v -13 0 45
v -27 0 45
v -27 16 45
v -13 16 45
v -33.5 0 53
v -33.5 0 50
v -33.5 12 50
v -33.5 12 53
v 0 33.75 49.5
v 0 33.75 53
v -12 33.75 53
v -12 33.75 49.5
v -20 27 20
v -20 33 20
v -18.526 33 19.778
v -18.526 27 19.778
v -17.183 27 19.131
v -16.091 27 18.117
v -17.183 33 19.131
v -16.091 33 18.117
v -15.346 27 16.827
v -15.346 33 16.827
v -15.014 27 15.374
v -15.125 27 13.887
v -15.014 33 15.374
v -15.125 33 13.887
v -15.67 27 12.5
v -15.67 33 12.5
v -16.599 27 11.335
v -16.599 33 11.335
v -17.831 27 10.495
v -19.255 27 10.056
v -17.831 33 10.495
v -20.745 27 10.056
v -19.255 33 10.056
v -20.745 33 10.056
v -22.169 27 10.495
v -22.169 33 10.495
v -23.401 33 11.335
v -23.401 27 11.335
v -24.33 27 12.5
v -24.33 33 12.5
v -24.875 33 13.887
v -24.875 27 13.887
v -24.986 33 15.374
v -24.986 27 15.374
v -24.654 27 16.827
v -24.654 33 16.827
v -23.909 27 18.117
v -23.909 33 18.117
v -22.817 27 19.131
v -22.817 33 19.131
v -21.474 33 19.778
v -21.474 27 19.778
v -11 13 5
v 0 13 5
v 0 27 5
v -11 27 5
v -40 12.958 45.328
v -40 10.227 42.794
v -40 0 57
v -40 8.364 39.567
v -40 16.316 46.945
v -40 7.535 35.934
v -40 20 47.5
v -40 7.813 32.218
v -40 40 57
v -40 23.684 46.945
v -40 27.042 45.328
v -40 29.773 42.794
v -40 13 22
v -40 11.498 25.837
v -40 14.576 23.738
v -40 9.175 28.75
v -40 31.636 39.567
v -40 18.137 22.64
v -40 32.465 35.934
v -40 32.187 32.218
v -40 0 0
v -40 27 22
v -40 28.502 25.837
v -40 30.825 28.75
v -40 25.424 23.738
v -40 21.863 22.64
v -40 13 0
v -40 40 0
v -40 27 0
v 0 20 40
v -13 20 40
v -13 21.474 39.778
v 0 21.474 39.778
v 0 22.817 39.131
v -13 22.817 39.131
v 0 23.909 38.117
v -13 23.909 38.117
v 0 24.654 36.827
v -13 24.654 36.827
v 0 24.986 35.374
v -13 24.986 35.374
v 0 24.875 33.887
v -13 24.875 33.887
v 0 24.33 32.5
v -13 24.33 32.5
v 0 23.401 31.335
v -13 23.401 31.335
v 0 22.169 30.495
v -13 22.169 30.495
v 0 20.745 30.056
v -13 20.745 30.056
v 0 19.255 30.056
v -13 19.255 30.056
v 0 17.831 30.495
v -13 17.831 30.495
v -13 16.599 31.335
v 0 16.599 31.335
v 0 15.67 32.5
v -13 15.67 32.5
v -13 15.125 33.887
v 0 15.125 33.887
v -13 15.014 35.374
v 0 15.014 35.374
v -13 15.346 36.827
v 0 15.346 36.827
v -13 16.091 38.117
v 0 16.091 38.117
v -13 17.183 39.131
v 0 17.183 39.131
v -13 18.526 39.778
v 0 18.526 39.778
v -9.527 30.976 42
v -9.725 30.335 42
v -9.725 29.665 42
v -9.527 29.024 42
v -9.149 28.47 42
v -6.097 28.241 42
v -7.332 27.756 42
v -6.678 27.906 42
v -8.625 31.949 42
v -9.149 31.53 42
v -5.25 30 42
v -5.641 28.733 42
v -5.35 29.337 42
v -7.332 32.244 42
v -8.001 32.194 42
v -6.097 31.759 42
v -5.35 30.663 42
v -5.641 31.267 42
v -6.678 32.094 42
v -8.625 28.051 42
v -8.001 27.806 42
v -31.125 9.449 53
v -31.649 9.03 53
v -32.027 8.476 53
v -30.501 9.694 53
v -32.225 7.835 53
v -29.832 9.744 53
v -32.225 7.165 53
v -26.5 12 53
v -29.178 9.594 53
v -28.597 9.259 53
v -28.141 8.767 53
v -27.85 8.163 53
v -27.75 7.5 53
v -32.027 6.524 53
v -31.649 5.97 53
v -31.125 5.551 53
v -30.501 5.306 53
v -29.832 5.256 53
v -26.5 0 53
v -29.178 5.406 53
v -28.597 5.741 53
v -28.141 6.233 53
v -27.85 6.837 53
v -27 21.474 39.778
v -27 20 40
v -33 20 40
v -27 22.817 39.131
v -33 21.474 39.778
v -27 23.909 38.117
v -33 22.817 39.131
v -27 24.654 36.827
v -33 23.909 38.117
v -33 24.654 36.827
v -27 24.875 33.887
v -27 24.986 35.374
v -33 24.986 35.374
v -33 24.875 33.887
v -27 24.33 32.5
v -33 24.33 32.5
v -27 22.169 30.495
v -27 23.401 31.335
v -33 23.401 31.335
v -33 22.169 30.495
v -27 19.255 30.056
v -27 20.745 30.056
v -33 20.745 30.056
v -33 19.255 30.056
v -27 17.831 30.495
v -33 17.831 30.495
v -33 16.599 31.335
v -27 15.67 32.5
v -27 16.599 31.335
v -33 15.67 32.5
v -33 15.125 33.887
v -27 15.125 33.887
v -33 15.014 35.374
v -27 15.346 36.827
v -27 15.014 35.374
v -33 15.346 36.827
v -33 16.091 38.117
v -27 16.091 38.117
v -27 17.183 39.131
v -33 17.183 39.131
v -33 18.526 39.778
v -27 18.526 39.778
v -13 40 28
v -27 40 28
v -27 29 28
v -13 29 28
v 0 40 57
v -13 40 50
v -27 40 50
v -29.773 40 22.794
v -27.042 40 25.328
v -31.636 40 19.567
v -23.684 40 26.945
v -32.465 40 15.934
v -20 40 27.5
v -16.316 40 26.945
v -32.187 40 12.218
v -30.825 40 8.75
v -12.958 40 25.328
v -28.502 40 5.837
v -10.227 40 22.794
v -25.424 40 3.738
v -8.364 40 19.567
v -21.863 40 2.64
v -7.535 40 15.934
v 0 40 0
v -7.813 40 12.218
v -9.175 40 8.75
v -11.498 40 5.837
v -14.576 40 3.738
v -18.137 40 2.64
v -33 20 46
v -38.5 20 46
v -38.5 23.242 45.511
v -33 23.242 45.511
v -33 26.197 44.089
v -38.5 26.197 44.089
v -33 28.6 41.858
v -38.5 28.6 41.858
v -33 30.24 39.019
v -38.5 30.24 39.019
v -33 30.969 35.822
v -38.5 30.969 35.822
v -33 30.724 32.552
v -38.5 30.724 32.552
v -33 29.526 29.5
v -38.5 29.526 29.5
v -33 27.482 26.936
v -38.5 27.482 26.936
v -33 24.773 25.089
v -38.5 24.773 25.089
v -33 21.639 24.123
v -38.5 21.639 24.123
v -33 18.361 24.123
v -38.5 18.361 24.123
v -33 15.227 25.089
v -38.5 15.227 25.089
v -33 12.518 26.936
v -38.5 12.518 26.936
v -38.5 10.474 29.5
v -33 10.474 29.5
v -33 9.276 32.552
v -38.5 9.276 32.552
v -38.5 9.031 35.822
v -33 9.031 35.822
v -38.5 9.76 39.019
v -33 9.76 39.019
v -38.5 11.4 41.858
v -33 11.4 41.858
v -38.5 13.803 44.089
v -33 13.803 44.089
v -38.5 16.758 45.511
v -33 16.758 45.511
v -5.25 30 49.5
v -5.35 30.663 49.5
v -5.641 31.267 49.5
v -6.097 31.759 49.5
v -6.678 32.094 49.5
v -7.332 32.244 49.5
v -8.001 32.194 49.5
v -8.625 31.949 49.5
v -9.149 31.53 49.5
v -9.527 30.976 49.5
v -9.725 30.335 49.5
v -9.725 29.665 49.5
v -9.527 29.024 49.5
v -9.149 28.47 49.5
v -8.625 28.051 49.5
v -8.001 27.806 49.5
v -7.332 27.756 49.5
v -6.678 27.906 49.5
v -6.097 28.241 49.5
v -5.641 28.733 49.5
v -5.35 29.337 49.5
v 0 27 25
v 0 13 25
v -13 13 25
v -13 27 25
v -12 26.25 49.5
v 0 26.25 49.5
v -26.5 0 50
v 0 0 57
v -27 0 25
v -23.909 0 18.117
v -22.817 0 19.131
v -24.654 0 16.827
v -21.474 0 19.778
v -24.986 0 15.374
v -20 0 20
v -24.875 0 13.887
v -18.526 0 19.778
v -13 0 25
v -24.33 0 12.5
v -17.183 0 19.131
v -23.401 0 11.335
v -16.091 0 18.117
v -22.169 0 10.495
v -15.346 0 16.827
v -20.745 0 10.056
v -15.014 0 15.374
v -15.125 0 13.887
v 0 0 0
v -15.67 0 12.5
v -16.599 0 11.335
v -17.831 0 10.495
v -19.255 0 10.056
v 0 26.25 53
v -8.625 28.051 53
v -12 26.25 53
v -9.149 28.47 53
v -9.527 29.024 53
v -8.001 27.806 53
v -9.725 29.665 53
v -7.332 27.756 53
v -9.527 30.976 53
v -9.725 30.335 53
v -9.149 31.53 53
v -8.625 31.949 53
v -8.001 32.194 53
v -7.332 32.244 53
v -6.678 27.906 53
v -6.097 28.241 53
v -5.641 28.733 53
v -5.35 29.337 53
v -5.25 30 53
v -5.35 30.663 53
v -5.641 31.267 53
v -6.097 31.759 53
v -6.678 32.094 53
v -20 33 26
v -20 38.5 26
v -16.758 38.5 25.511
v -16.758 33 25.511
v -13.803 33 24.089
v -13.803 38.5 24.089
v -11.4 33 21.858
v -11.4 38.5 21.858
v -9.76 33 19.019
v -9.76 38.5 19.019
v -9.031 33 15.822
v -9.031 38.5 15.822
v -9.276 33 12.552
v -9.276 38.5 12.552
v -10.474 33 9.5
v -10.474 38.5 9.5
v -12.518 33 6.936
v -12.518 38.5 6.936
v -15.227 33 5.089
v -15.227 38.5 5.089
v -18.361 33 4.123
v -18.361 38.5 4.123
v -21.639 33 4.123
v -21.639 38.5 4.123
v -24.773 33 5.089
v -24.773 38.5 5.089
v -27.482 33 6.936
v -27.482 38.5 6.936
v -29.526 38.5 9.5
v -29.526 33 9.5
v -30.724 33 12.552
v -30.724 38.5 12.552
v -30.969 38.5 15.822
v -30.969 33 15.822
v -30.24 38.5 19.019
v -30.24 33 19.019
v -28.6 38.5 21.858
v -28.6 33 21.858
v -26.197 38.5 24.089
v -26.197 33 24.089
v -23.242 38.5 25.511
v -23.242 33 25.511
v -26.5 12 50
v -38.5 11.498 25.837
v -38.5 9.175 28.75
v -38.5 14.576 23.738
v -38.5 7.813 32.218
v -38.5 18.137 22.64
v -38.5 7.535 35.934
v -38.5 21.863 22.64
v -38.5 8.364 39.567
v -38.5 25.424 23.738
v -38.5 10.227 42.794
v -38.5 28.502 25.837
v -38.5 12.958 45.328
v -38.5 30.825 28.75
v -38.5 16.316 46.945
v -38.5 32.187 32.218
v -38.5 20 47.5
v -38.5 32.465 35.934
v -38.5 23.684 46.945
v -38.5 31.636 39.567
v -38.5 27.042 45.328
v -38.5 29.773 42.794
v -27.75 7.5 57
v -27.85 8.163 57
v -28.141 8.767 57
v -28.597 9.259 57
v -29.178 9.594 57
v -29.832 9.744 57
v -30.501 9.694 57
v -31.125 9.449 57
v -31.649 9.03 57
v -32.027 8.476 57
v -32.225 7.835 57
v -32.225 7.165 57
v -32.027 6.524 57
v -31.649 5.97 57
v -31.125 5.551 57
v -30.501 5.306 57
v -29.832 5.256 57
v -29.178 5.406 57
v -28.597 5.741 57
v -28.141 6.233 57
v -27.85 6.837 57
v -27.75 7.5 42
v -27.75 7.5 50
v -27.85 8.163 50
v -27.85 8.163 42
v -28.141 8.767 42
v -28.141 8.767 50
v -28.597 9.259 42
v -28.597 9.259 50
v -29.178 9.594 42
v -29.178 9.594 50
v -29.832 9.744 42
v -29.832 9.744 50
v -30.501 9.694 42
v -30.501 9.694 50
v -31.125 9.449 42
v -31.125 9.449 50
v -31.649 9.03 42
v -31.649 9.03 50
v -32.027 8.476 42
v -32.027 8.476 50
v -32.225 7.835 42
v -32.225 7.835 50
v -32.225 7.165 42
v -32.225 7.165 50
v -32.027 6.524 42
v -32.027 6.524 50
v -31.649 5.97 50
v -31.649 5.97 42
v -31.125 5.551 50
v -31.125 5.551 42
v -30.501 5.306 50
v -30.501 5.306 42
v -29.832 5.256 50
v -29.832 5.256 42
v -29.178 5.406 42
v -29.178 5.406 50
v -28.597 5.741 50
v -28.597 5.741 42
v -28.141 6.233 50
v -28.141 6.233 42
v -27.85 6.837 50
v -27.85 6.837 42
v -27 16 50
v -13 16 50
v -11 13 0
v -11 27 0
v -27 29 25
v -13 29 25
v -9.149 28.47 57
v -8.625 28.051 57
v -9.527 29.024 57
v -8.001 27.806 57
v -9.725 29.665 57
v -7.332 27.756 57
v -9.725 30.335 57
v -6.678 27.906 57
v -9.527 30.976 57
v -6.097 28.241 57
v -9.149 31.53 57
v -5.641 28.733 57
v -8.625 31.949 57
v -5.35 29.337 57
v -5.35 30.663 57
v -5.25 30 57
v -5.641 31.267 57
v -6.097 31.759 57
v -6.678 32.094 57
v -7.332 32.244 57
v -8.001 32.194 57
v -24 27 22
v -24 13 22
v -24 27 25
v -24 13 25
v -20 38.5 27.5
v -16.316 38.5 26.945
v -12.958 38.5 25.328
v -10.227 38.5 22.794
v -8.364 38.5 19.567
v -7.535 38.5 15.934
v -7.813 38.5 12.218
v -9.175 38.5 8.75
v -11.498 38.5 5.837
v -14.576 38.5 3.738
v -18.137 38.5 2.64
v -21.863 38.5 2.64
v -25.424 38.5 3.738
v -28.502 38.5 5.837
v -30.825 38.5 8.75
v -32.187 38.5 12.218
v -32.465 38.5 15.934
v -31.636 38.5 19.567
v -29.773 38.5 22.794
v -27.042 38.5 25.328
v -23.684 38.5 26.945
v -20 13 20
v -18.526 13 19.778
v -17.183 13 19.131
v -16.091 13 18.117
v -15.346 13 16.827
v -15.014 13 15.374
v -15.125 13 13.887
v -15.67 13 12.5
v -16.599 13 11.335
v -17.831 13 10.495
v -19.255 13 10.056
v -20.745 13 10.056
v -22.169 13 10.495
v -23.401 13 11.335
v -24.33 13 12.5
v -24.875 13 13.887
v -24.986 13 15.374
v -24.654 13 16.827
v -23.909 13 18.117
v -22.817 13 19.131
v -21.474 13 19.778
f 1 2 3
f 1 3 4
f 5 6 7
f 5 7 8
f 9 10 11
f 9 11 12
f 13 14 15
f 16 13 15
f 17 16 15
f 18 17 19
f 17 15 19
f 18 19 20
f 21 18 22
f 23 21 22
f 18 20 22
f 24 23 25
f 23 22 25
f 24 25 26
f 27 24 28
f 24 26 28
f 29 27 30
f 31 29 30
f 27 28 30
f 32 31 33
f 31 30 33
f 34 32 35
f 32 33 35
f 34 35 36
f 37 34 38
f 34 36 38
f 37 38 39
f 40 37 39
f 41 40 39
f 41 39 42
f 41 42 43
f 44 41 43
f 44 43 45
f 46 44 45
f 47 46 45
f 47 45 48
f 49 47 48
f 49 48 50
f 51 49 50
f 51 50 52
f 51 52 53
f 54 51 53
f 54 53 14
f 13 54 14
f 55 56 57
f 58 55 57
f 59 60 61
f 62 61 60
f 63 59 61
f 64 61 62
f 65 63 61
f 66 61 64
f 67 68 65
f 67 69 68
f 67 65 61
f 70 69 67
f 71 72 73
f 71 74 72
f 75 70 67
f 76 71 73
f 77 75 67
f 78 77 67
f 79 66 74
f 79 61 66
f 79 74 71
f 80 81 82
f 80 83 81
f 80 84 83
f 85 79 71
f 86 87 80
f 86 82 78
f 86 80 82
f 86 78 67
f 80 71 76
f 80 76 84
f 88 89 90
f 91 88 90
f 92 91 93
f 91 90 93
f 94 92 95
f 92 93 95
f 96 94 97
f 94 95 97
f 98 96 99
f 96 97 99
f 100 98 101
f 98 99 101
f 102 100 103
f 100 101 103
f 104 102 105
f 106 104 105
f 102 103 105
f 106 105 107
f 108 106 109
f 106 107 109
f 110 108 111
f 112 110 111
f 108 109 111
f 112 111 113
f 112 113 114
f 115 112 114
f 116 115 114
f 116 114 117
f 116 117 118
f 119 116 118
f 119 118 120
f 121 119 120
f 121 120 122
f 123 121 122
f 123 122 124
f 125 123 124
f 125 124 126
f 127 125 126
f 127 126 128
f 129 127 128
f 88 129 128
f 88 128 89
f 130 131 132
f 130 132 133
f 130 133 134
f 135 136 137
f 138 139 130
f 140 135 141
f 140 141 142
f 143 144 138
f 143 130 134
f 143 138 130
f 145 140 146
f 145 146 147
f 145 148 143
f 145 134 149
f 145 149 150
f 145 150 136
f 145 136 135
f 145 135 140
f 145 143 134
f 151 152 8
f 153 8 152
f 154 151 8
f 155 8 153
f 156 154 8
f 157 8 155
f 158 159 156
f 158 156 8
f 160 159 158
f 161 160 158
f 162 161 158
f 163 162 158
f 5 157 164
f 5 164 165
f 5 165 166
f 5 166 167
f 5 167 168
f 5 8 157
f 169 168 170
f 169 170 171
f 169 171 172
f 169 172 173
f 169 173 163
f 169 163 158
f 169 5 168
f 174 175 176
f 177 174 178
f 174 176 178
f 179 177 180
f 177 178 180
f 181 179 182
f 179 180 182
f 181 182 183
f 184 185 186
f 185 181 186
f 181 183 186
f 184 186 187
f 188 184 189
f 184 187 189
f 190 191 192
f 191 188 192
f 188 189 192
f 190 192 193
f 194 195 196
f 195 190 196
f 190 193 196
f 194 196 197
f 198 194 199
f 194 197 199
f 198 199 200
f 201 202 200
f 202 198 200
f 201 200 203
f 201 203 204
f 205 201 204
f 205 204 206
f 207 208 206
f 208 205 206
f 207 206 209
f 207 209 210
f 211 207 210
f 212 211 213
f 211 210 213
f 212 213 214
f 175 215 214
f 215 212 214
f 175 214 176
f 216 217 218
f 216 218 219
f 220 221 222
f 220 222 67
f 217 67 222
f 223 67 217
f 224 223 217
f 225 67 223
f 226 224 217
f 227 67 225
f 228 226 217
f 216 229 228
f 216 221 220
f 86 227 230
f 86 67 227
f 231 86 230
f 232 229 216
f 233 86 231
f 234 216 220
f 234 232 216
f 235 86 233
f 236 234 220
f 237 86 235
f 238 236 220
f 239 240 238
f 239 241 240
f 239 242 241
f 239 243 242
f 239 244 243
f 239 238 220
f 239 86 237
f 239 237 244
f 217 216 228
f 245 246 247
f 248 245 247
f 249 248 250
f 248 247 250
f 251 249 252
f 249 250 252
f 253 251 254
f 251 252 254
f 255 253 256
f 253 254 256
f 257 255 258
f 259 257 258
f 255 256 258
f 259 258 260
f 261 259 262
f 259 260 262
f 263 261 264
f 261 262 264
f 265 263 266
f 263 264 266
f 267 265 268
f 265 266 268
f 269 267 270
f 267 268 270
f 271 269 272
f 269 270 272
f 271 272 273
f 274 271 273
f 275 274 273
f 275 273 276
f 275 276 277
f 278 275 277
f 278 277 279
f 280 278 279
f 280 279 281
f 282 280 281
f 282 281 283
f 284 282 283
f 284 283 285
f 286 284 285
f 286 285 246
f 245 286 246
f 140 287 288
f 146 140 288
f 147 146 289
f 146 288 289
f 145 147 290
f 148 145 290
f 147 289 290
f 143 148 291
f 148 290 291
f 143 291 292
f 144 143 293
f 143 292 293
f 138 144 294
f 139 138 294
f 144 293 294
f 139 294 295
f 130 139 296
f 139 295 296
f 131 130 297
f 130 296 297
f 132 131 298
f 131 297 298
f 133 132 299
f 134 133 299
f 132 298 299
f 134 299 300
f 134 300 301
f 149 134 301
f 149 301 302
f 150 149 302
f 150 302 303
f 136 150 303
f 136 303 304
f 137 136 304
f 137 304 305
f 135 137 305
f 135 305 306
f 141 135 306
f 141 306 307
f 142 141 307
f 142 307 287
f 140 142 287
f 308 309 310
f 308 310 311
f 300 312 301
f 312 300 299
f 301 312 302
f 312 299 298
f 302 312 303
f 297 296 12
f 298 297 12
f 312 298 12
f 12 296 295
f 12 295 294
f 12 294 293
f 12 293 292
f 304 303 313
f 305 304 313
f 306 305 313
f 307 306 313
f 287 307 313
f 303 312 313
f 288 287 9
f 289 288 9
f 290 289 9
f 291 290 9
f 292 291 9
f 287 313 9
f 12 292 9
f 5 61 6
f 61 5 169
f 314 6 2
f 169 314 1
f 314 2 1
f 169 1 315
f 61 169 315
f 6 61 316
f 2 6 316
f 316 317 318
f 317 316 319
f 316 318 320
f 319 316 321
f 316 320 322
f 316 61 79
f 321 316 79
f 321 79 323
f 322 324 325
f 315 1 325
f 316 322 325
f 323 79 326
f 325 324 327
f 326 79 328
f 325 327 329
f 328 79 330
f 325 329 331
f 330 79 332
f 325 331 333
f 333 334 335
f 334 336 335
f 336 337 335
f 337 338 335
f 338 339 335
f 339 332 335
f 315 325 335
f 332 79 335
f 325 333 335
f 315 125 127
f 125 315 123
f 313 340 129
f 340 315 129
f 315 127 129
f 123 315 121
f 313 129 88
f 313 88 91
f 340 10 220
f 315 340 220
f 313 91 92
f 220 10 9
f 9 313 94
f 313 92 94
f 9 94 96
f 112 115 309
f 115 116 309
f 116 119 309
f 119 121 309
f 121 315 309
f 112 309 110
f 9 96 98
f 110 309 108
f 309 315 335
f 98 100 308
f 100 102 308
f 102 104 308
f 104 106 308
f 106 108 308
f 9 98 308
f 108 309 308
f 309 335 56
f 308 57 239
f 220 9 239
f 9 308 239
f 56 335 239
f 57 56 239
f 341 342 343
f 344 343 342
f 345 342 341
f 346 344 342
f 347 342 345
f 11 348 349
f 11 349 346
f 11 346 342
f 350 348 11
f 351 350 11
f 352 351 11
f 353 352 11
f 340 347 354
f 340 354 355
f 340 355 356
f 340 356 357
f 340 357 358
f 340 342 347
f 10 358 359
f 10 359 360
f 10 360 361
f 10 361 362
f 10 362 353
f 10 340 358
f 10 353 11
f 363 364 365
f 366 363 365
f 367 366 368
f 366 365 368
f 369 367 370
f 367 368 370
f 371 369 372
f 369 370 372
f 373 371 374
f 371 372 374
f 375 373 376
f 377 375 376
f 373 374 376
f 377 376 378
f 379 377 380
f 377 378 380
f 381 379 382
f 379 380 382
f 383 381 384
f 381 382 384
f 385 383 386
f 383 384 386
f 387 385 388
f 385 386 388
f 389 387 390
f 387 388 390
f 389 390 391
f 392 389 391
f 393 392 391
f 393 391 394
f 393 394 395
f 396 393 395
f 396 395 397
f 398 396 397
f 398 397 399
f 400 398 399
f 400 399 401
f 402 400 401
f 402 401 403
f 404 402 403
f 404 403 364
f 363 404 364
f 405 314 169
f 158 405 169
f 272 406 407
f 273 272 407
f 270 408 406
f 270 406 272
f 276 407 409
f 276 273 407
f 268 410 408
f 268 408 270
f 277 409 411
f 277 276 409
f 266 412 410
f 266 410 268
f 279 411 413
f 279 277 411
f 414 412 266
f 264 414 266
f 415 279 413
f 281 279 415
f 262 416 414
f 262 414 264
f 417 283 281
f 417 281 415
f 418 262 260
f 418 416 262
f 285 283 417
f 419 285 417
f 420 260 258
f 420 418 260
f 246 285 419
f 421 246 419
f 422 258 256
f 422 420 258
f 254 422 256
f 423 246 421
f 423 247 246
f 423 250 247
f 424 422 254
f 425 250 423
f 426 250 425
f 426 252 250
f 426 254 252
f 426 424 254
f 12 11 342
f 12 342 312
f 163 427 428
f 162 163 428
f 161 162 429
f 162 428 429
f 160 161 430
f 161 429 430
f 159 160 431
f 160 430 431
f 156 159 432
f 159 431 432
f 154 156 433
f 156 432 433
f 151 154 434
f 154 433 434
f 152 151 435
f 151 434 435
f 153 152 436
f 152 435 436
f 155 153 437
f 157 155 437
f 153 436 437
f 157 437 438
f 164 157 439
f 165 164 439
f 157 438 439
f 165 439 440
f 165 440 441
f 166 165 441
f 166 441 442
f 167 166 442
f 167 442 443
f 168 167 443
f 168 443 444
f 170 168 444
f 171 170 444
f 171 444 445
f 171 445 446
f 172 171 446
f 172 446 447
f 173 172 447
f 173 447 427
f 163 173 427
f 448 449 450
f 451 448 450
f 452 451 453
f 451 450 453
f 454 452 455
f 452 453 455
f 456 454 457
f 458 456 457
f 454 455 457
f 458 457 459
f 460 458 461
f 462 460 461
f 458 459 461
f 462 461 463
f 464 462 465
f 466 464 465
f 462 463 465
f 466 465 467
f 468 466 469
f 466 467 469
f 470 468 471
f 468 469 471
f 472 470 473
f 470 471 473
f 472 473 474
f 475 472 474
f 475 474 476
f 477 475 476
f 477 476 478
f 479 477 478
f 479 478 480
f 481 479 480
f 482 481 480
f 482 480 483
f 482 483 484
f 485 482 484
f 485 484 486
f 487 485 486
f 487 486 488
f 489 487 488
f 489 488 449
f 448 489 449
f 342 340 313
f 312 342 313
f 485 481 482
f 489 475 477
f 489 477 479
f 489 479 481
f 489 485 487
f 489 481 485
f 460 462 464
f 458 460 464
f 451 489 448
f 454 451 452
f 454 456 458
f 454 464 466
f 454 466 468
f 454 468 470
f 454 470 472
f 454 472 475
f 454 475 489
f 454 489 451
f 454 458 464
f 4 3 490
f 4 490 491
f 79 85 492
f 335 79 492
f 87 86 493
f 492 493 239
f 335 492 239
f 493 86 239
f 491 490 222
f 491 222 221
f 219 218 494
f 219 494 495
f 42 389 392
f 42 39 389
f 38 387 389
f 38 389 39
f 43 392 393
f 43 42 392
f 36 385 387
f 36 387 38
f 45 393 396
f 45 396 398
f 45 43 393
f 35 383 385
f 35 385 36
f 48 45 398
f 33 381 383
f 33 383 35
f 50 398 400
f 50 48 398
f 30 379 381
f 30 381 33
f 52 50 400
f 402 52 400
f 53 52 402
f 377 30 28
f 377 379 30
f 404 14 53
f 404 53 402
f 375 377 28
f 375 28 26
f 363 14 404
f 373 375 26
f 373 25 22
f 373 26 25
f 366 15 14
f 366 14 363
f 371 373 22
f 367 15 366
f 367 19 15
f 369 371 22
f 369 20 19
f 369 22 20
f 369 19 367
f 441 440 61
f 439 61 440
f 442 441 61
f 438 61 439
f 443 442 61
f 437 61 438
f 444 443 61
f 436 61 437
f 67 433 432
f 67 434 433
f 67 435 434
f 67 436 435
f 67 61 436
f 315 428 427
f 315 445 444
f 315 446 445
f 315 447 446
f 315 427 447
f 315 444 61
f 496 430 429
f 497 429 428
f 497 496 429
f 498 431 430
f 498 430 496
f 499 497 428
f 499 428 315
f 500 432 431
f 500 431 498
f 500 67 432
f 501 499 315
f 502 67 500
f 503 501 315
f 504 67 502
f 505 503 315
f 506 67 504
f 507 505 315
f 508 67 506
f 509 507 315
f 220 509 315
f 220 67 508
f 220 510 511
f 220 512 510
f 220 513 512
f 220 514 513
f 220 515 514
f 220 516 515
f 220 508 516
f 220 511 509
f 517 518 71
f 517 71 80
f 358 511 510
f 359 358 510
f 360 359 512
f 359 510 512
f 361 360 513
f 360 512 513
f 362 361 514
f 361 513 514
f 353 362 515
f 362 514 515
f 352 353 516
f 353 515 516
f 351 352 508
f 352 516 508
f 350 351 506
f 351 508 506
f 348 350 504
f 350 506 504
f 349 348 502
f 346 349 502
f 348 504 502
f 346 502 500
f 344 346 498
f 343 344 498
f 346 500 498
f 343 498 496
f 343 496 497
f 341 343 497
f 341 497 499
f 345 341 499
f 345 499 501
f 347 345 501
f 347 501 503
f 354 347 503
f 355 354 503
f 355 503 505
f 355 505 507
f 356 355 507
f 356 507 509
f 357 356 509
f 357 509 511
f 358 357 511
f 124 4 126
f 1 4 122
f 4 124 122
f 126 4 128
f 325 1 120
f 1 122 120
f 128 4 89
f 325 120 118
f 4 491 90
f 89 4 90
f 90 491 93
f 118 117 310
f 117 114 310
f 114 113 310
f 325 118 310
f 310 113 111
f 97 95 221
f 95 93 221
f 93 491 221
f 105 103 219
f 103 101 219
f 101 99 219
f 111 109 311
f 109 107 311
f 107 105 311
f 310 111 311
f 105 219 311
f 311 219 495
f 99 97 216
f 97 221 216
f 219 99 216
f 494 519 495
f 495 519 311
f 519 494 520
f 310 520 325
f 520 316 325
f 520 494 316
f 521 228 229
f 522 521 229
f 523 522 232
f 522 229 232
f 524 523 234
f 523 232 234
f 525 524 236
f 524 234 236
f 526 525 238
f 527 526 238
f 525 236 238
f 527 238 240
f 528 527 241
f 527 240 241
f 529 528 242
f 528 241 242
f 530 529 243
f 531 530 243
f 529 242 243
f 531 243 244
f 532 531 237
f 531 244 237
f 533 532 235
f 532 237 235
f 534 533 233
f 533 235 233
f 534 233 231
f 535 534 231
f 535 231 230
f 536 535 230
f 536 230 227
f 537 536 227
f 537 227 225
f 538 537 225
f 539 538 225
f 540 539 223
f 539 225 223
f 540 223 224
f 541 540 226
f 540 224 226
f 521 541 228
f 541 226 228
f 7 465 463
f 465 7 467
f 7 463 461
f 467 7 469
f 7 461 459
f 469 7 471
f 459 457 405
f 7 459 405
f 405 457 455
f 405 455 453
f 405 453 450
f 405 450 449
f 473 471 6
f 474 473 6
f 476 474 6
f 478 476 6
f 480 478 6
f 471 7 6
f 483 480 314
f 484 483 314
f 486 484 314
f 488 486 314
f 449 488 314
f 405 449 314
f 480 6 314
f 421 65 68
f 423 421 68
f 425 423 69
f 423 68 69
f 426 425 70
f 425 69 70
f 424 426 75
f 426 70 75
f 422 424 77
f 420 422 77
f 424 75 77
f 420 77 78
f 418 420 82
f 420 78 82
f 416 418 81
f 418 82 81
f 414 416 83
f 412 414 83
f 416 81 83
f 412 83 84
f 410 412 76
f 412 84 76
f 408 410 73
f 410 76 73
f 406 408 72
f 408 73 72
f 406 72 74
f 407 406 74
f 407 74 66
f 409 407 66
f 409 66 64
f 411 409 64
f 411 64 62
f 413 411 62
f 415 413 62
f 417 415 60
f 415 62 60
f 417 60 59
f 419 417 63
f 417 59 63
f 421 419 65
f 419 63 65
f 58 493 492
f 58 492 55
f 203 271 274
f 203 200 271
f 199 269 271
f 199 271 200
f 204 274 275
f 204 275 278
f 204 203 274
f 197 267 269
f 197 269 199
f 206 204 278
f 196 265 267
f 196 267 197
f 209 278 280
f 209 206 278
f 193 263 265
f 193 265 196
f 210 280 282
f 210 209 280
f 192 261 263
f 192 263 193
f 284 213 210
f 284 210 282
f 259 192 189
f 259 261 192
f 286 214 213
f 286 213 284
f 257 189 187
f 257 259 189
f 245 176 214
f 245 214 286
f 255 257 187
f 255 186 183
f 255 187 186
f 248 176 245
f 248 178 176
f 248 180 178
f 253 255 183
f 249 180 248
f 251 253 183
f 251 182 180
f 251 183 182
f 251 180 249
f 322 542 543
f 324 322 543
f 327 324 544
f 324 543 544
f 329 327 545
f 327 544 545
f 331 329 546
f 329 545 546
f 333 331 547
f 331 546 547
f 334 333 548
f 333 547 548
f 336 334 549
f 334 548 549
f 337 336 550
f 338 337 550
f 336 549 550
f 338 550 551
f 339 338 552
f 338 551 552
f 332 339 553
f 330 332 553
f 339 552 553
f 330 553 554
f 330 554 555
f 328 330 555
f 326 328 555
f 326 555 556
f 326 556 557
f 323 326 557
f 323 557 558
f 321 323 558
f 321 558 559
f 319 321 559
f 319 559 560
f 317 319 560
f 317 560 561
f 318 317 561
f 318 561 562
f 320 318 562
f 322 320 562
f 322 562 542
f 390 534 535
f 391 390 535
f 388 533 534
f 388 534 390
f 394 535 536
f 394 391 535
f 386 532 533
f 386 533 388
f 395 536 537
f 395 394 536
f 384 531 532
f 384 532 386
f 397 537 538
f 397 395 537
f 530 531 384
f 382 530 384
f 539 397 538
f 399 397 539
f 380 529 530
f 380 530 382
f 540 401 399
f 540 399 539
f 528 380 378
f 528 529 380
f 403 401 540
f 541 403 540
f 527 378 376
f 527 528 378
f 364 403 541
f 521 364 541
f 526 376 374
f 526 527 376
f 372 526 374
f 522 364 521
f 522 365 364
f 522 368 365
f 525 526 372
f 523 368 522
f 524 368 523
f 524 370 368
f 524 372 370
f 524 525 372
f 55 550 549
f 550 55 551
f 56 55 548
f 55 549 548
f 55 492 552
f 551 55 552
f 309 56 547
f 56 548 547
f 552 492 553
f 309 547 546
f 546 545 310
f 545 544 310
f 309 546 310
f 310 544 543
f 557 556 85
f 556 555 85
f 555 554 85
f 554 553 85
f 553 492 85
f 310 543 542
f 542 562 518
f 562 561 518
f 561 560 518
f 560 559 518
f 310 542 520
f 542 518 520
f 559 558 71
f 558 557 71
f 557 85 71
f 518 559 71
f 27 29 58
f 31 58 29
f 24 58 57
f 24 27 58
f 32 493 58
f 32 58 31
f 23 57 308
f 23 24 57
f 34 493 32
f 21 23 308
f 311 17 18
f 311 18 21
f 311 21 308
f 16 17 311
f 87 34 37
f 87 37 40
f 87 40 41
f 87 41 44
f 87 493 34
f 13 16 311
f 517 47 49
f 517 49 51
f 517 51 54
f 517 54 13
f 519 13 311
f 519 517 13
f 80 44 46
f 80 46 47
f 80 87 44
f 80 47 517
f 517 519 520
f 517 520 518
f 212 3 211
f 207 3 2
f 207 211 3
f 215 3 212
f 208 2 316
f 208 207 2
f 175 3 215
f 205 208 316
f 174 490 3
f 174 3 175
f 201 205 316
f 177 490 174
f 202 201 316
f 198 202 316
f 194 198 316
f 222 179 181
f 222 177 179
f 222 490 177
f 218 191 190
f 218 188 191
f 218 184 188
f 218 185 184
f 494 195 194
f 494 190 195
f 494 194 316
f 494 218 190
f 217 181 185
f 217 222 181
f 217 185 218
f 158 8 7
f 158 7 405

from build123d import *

# Parameters (mm, degrees)
ESQUISSE1_W              = 40
ESQUISSE1_H              = 40
BOSS_EXTRU_1_DEPTH       = 50
ESQUISSE2_R              = 5
ENL_V_MAT_EXTRU_1_DEPTH  = 41
ESQUISSE3_R              = 5
ENL_V_MAT_EXTRU_2_DEPTH  = 41
ESQUISSE4_W              = 22
ESQUISSE4_H              = 14
ENL_V_MAT_EXTRU_3_DEPTH  = 29
ESQUISSE5_W              = 14
ESQUISSE5_H              = 20
ENL_V_MAT_EXTRU_4_DEPTH  = 29
ESQUISSE6_W              = 20
ESQUISSE6_H              = 14
ENL_V_MAT_EXTRU_5_DEPTH  = 24
ESQUISSE7_W              = 14
ESQUISSE7_H              = 22
ENL_V_MAT_EXTRU_6_DEPTH  = 24
ESQUISSE10_R             = 11
ENL_V_MAT_EXTRU_9_DEPTH  = 7
ESQUISSE11_R             = 12.5
ENL_V_MAT_EXTRU_10_DEPTH = 1.5
ESQUISSE14_R             = 11
ENL_V_MAT_EXTRU_11_DEPTH = 7
ESQUISSE15_R             = 12.5
ENL_V_MAT_EXTRU_12_DEPTH = 1.5
ESQUISSE16_W             = 40
ESQUISSE16_H             = 40
BOSS_EXTRU_2_DEPTH       = 7
ESQUISSE17_R             = 2.25
ENL_V_MAT_EXTRU_13_DEPTH = 15
ESQUISSE18_W             = 7
ESQUISSE18_H             = 3
ENL_V_MAT_EXTRU_14_DEPTH = 12
ESQUISSE19_W             = 3.5
ESQUISSE19_H             = 7.5
ENL_V_MAT_EXTRU_15_DEPTH = 12


with BuildPart() as part:
    # Esquisse1 → Boss.-Extru.1 (new body)
    with BuildSketch(Plane.XY):
        with Locations((-20, 20)):
            Rectangle(ESQUISSE1_W, ESQUISSE1_H)
    extrude(amount=BOSS_EXTRU_1_DEPTH)

    # Esquisse2 → Enlèv. mat.-Extru.1 (cut, through all)
    with BuildSketch(Plane(origin=(0, 40, 0), x_dir=(1, 0, 0), z_dir=(0, 1, 0))):
        with Locations(Location((-20, -15, 0), (0, 0, 270))):  # turned: the seam where the file's is
            Circle(ESQUISSE2_R)
    extrude(amount=-ENL_V_MAT_EXTRU_1_DEPTH, mode=Mode.SUBTRACT)

    # Esquisse3 → Enlèv. mat.-Extru.2 (cut, through all)
    with BuildSketch(Plane.ZY.offset(40)):
        with Locations((35, 20)):
            Circle(ESQUISSE3_R)
    extrude(amount=-ENL_V_MAT_EXTRU_2_DEPTH, mode=Mode.SUBTRACT)

    # Esquisse4 → Enlèv. mat.-Extru.3 (cut)
    with BuildSketch(Plane.ZY.offset(40)):
        with Locations((11, 20)):
            Rectangle(ESQUISSE4_W, ESQUISSE4_H)
    extrude(amount=-ENL_V_MAT_EXTRU_3_DEPTH, mode=Mode.SUBTRACT)

    # Esquisse5 → Enlèv. mat.-Extru.4 (cut)
    with BuildSketch(Plane.XZ):
        with Locations((-20, 35)):
            Rectangle(ESQUISSE5_W, ESQUISSE5_H)
    extrude(amount=-ENL_V_MAT_EXTRU_4_DEPTH, mode=Mode.SUBTRACT)

    # Esquisse6 → Enlèv. mat.-Extru.5 (cut)
    with BuildSketch(Plane(origin=(0, 0, 0), x_dir=(0, 0, -1), z_dir=(1, 0, 0))):
        with Locations((-15, 20)):
            Rectangle(ESQUISSE6_W, ESQUISSE6_H)
    extrude(amount=-ENL_V_MAT_EXTRU_5_DEPTH, mode=Mode.SUBTRACT)

    # Esquisse7 → Enlèv. mat.-Extru.6 (cut)
    with BuildSketch(Plane(origin=(0, 40, 0), x_dir=(1, 0, 0), z_dir=(0, 1, 0))):
        with Locations((-20, -39)):
            Rectangle(ESQUISSE7_W, ESQUISSE7_H)
    extrude(amount=-ENL_V_MAT_EXTRU_6_DEPTH, mode=Mode.SUBTRACT)

    # Esquisse10 → Enlèv. mat.-Extru.9 (cut)
    with BuildSketch(Plane(origin=(0, 40, 0), x_dir=(1, 0, 0), z_dir=(0, 1, 0))):
        with Locations(Location((-20, -15, 0), (0, 0, 270))):  # turned: the seam where the file's is
            Circle(ESQUISSE10_R)
    extrude(amount=-ENL_V_MAT_EXTRU_9_DEPTH, mode=Mode.SUBTRACT)

    # Esquisse11 → Enlèv. mat.-Extru.10 (cut)
    with BuildSketch(Plane(origin=(0, 40, 0), x_dir=(1, 0, 0), z_dir=(0, 1, 0))):
        with Locations(Location((-20, -15, 0), (0, 0, 270))):  # turned: the seam where the file's is
            Circle(ESQUISSE11_R)
    extrude(amount=-ENL_V_MAT_EXTRU_10_DEPTH, mode=Mode.SUBTRACT)

    # Esquisse14 → Enlèv. mat.-Extru.11 (cut)
    with BuildSketch(Plane.ZY.offset(40)):
        with Locations((35, 20)):
            Circle(ESQUISSE14_R)
    extrude(amount=-ENL_V_MAT_EXTRU_11_DEPTH, mode=Mode.SUBTRACT)

    # Esquisse15 → Enlèv. mat.-Extru.12 (cut)
    with BuildSketch(Plane.ZY.offset(40)):
        with Locations((35, 20)):
            Circle(ESQUISSE15_R)
    extrude(amount=-ENL_V_MAT_EXTRU_12_DEPTH, mode=Mode.SUBTRACT)

    # Esquisse16 → Boss.-Extru.2 (add)
    with BuildSketch(Plane.XY.offset(50)):
        with Locations((-20, 20)):
            Rectangle(ESQUISSE16_W, ESQUISSE16_H)
    extrude(amount=BOSS_EXTRU_2_DEPTH)

    # Esquisse17 → Enlèv. mat.-Extru.13 (cut)
    with BuildSketch(Plane.XY.offset(57)):
        with Locations((-30, 7.5)):
            Circle(ESQUISSE17_R)
        with Locations((-7.5, 30)):
            Circle(ESQUISSE17_R)
    extrude(amount=-ENL_V_MAT_EXTRU_13_DEPTH, mode=Mode.SUBTRACT)

    # Esquisse18 → Enlèv. mat.-Extru.14 (cut)
    with BuildSketch(Plane.XZ):
        with Locations((-30, 51.5)):
            Rectangle(ESQUISSE18_W, ESQUISSE18_H)
    extrude(amount=-ENL_V_MAT_EXTRU_14_DEPTH, mode=Mode.SUBTRACT)

    # Esquisse19 → Enlèv. mat.-Extru.15 (cut)
    with BuildSketch(Plane(origin=(0, 0, 0), x_dir=(0, 0, -1), z_dir=(1, 0, 0))):
        with Locations((-51.25, 30)):
            Rectangle(ESQUISSE19_W, ESQUISSE19_H)
    extrude(amount=-ENL_V_MAT_EXTRU_15_DEPTH, mode=Mode.SUBTRACT)


solid = part.part
